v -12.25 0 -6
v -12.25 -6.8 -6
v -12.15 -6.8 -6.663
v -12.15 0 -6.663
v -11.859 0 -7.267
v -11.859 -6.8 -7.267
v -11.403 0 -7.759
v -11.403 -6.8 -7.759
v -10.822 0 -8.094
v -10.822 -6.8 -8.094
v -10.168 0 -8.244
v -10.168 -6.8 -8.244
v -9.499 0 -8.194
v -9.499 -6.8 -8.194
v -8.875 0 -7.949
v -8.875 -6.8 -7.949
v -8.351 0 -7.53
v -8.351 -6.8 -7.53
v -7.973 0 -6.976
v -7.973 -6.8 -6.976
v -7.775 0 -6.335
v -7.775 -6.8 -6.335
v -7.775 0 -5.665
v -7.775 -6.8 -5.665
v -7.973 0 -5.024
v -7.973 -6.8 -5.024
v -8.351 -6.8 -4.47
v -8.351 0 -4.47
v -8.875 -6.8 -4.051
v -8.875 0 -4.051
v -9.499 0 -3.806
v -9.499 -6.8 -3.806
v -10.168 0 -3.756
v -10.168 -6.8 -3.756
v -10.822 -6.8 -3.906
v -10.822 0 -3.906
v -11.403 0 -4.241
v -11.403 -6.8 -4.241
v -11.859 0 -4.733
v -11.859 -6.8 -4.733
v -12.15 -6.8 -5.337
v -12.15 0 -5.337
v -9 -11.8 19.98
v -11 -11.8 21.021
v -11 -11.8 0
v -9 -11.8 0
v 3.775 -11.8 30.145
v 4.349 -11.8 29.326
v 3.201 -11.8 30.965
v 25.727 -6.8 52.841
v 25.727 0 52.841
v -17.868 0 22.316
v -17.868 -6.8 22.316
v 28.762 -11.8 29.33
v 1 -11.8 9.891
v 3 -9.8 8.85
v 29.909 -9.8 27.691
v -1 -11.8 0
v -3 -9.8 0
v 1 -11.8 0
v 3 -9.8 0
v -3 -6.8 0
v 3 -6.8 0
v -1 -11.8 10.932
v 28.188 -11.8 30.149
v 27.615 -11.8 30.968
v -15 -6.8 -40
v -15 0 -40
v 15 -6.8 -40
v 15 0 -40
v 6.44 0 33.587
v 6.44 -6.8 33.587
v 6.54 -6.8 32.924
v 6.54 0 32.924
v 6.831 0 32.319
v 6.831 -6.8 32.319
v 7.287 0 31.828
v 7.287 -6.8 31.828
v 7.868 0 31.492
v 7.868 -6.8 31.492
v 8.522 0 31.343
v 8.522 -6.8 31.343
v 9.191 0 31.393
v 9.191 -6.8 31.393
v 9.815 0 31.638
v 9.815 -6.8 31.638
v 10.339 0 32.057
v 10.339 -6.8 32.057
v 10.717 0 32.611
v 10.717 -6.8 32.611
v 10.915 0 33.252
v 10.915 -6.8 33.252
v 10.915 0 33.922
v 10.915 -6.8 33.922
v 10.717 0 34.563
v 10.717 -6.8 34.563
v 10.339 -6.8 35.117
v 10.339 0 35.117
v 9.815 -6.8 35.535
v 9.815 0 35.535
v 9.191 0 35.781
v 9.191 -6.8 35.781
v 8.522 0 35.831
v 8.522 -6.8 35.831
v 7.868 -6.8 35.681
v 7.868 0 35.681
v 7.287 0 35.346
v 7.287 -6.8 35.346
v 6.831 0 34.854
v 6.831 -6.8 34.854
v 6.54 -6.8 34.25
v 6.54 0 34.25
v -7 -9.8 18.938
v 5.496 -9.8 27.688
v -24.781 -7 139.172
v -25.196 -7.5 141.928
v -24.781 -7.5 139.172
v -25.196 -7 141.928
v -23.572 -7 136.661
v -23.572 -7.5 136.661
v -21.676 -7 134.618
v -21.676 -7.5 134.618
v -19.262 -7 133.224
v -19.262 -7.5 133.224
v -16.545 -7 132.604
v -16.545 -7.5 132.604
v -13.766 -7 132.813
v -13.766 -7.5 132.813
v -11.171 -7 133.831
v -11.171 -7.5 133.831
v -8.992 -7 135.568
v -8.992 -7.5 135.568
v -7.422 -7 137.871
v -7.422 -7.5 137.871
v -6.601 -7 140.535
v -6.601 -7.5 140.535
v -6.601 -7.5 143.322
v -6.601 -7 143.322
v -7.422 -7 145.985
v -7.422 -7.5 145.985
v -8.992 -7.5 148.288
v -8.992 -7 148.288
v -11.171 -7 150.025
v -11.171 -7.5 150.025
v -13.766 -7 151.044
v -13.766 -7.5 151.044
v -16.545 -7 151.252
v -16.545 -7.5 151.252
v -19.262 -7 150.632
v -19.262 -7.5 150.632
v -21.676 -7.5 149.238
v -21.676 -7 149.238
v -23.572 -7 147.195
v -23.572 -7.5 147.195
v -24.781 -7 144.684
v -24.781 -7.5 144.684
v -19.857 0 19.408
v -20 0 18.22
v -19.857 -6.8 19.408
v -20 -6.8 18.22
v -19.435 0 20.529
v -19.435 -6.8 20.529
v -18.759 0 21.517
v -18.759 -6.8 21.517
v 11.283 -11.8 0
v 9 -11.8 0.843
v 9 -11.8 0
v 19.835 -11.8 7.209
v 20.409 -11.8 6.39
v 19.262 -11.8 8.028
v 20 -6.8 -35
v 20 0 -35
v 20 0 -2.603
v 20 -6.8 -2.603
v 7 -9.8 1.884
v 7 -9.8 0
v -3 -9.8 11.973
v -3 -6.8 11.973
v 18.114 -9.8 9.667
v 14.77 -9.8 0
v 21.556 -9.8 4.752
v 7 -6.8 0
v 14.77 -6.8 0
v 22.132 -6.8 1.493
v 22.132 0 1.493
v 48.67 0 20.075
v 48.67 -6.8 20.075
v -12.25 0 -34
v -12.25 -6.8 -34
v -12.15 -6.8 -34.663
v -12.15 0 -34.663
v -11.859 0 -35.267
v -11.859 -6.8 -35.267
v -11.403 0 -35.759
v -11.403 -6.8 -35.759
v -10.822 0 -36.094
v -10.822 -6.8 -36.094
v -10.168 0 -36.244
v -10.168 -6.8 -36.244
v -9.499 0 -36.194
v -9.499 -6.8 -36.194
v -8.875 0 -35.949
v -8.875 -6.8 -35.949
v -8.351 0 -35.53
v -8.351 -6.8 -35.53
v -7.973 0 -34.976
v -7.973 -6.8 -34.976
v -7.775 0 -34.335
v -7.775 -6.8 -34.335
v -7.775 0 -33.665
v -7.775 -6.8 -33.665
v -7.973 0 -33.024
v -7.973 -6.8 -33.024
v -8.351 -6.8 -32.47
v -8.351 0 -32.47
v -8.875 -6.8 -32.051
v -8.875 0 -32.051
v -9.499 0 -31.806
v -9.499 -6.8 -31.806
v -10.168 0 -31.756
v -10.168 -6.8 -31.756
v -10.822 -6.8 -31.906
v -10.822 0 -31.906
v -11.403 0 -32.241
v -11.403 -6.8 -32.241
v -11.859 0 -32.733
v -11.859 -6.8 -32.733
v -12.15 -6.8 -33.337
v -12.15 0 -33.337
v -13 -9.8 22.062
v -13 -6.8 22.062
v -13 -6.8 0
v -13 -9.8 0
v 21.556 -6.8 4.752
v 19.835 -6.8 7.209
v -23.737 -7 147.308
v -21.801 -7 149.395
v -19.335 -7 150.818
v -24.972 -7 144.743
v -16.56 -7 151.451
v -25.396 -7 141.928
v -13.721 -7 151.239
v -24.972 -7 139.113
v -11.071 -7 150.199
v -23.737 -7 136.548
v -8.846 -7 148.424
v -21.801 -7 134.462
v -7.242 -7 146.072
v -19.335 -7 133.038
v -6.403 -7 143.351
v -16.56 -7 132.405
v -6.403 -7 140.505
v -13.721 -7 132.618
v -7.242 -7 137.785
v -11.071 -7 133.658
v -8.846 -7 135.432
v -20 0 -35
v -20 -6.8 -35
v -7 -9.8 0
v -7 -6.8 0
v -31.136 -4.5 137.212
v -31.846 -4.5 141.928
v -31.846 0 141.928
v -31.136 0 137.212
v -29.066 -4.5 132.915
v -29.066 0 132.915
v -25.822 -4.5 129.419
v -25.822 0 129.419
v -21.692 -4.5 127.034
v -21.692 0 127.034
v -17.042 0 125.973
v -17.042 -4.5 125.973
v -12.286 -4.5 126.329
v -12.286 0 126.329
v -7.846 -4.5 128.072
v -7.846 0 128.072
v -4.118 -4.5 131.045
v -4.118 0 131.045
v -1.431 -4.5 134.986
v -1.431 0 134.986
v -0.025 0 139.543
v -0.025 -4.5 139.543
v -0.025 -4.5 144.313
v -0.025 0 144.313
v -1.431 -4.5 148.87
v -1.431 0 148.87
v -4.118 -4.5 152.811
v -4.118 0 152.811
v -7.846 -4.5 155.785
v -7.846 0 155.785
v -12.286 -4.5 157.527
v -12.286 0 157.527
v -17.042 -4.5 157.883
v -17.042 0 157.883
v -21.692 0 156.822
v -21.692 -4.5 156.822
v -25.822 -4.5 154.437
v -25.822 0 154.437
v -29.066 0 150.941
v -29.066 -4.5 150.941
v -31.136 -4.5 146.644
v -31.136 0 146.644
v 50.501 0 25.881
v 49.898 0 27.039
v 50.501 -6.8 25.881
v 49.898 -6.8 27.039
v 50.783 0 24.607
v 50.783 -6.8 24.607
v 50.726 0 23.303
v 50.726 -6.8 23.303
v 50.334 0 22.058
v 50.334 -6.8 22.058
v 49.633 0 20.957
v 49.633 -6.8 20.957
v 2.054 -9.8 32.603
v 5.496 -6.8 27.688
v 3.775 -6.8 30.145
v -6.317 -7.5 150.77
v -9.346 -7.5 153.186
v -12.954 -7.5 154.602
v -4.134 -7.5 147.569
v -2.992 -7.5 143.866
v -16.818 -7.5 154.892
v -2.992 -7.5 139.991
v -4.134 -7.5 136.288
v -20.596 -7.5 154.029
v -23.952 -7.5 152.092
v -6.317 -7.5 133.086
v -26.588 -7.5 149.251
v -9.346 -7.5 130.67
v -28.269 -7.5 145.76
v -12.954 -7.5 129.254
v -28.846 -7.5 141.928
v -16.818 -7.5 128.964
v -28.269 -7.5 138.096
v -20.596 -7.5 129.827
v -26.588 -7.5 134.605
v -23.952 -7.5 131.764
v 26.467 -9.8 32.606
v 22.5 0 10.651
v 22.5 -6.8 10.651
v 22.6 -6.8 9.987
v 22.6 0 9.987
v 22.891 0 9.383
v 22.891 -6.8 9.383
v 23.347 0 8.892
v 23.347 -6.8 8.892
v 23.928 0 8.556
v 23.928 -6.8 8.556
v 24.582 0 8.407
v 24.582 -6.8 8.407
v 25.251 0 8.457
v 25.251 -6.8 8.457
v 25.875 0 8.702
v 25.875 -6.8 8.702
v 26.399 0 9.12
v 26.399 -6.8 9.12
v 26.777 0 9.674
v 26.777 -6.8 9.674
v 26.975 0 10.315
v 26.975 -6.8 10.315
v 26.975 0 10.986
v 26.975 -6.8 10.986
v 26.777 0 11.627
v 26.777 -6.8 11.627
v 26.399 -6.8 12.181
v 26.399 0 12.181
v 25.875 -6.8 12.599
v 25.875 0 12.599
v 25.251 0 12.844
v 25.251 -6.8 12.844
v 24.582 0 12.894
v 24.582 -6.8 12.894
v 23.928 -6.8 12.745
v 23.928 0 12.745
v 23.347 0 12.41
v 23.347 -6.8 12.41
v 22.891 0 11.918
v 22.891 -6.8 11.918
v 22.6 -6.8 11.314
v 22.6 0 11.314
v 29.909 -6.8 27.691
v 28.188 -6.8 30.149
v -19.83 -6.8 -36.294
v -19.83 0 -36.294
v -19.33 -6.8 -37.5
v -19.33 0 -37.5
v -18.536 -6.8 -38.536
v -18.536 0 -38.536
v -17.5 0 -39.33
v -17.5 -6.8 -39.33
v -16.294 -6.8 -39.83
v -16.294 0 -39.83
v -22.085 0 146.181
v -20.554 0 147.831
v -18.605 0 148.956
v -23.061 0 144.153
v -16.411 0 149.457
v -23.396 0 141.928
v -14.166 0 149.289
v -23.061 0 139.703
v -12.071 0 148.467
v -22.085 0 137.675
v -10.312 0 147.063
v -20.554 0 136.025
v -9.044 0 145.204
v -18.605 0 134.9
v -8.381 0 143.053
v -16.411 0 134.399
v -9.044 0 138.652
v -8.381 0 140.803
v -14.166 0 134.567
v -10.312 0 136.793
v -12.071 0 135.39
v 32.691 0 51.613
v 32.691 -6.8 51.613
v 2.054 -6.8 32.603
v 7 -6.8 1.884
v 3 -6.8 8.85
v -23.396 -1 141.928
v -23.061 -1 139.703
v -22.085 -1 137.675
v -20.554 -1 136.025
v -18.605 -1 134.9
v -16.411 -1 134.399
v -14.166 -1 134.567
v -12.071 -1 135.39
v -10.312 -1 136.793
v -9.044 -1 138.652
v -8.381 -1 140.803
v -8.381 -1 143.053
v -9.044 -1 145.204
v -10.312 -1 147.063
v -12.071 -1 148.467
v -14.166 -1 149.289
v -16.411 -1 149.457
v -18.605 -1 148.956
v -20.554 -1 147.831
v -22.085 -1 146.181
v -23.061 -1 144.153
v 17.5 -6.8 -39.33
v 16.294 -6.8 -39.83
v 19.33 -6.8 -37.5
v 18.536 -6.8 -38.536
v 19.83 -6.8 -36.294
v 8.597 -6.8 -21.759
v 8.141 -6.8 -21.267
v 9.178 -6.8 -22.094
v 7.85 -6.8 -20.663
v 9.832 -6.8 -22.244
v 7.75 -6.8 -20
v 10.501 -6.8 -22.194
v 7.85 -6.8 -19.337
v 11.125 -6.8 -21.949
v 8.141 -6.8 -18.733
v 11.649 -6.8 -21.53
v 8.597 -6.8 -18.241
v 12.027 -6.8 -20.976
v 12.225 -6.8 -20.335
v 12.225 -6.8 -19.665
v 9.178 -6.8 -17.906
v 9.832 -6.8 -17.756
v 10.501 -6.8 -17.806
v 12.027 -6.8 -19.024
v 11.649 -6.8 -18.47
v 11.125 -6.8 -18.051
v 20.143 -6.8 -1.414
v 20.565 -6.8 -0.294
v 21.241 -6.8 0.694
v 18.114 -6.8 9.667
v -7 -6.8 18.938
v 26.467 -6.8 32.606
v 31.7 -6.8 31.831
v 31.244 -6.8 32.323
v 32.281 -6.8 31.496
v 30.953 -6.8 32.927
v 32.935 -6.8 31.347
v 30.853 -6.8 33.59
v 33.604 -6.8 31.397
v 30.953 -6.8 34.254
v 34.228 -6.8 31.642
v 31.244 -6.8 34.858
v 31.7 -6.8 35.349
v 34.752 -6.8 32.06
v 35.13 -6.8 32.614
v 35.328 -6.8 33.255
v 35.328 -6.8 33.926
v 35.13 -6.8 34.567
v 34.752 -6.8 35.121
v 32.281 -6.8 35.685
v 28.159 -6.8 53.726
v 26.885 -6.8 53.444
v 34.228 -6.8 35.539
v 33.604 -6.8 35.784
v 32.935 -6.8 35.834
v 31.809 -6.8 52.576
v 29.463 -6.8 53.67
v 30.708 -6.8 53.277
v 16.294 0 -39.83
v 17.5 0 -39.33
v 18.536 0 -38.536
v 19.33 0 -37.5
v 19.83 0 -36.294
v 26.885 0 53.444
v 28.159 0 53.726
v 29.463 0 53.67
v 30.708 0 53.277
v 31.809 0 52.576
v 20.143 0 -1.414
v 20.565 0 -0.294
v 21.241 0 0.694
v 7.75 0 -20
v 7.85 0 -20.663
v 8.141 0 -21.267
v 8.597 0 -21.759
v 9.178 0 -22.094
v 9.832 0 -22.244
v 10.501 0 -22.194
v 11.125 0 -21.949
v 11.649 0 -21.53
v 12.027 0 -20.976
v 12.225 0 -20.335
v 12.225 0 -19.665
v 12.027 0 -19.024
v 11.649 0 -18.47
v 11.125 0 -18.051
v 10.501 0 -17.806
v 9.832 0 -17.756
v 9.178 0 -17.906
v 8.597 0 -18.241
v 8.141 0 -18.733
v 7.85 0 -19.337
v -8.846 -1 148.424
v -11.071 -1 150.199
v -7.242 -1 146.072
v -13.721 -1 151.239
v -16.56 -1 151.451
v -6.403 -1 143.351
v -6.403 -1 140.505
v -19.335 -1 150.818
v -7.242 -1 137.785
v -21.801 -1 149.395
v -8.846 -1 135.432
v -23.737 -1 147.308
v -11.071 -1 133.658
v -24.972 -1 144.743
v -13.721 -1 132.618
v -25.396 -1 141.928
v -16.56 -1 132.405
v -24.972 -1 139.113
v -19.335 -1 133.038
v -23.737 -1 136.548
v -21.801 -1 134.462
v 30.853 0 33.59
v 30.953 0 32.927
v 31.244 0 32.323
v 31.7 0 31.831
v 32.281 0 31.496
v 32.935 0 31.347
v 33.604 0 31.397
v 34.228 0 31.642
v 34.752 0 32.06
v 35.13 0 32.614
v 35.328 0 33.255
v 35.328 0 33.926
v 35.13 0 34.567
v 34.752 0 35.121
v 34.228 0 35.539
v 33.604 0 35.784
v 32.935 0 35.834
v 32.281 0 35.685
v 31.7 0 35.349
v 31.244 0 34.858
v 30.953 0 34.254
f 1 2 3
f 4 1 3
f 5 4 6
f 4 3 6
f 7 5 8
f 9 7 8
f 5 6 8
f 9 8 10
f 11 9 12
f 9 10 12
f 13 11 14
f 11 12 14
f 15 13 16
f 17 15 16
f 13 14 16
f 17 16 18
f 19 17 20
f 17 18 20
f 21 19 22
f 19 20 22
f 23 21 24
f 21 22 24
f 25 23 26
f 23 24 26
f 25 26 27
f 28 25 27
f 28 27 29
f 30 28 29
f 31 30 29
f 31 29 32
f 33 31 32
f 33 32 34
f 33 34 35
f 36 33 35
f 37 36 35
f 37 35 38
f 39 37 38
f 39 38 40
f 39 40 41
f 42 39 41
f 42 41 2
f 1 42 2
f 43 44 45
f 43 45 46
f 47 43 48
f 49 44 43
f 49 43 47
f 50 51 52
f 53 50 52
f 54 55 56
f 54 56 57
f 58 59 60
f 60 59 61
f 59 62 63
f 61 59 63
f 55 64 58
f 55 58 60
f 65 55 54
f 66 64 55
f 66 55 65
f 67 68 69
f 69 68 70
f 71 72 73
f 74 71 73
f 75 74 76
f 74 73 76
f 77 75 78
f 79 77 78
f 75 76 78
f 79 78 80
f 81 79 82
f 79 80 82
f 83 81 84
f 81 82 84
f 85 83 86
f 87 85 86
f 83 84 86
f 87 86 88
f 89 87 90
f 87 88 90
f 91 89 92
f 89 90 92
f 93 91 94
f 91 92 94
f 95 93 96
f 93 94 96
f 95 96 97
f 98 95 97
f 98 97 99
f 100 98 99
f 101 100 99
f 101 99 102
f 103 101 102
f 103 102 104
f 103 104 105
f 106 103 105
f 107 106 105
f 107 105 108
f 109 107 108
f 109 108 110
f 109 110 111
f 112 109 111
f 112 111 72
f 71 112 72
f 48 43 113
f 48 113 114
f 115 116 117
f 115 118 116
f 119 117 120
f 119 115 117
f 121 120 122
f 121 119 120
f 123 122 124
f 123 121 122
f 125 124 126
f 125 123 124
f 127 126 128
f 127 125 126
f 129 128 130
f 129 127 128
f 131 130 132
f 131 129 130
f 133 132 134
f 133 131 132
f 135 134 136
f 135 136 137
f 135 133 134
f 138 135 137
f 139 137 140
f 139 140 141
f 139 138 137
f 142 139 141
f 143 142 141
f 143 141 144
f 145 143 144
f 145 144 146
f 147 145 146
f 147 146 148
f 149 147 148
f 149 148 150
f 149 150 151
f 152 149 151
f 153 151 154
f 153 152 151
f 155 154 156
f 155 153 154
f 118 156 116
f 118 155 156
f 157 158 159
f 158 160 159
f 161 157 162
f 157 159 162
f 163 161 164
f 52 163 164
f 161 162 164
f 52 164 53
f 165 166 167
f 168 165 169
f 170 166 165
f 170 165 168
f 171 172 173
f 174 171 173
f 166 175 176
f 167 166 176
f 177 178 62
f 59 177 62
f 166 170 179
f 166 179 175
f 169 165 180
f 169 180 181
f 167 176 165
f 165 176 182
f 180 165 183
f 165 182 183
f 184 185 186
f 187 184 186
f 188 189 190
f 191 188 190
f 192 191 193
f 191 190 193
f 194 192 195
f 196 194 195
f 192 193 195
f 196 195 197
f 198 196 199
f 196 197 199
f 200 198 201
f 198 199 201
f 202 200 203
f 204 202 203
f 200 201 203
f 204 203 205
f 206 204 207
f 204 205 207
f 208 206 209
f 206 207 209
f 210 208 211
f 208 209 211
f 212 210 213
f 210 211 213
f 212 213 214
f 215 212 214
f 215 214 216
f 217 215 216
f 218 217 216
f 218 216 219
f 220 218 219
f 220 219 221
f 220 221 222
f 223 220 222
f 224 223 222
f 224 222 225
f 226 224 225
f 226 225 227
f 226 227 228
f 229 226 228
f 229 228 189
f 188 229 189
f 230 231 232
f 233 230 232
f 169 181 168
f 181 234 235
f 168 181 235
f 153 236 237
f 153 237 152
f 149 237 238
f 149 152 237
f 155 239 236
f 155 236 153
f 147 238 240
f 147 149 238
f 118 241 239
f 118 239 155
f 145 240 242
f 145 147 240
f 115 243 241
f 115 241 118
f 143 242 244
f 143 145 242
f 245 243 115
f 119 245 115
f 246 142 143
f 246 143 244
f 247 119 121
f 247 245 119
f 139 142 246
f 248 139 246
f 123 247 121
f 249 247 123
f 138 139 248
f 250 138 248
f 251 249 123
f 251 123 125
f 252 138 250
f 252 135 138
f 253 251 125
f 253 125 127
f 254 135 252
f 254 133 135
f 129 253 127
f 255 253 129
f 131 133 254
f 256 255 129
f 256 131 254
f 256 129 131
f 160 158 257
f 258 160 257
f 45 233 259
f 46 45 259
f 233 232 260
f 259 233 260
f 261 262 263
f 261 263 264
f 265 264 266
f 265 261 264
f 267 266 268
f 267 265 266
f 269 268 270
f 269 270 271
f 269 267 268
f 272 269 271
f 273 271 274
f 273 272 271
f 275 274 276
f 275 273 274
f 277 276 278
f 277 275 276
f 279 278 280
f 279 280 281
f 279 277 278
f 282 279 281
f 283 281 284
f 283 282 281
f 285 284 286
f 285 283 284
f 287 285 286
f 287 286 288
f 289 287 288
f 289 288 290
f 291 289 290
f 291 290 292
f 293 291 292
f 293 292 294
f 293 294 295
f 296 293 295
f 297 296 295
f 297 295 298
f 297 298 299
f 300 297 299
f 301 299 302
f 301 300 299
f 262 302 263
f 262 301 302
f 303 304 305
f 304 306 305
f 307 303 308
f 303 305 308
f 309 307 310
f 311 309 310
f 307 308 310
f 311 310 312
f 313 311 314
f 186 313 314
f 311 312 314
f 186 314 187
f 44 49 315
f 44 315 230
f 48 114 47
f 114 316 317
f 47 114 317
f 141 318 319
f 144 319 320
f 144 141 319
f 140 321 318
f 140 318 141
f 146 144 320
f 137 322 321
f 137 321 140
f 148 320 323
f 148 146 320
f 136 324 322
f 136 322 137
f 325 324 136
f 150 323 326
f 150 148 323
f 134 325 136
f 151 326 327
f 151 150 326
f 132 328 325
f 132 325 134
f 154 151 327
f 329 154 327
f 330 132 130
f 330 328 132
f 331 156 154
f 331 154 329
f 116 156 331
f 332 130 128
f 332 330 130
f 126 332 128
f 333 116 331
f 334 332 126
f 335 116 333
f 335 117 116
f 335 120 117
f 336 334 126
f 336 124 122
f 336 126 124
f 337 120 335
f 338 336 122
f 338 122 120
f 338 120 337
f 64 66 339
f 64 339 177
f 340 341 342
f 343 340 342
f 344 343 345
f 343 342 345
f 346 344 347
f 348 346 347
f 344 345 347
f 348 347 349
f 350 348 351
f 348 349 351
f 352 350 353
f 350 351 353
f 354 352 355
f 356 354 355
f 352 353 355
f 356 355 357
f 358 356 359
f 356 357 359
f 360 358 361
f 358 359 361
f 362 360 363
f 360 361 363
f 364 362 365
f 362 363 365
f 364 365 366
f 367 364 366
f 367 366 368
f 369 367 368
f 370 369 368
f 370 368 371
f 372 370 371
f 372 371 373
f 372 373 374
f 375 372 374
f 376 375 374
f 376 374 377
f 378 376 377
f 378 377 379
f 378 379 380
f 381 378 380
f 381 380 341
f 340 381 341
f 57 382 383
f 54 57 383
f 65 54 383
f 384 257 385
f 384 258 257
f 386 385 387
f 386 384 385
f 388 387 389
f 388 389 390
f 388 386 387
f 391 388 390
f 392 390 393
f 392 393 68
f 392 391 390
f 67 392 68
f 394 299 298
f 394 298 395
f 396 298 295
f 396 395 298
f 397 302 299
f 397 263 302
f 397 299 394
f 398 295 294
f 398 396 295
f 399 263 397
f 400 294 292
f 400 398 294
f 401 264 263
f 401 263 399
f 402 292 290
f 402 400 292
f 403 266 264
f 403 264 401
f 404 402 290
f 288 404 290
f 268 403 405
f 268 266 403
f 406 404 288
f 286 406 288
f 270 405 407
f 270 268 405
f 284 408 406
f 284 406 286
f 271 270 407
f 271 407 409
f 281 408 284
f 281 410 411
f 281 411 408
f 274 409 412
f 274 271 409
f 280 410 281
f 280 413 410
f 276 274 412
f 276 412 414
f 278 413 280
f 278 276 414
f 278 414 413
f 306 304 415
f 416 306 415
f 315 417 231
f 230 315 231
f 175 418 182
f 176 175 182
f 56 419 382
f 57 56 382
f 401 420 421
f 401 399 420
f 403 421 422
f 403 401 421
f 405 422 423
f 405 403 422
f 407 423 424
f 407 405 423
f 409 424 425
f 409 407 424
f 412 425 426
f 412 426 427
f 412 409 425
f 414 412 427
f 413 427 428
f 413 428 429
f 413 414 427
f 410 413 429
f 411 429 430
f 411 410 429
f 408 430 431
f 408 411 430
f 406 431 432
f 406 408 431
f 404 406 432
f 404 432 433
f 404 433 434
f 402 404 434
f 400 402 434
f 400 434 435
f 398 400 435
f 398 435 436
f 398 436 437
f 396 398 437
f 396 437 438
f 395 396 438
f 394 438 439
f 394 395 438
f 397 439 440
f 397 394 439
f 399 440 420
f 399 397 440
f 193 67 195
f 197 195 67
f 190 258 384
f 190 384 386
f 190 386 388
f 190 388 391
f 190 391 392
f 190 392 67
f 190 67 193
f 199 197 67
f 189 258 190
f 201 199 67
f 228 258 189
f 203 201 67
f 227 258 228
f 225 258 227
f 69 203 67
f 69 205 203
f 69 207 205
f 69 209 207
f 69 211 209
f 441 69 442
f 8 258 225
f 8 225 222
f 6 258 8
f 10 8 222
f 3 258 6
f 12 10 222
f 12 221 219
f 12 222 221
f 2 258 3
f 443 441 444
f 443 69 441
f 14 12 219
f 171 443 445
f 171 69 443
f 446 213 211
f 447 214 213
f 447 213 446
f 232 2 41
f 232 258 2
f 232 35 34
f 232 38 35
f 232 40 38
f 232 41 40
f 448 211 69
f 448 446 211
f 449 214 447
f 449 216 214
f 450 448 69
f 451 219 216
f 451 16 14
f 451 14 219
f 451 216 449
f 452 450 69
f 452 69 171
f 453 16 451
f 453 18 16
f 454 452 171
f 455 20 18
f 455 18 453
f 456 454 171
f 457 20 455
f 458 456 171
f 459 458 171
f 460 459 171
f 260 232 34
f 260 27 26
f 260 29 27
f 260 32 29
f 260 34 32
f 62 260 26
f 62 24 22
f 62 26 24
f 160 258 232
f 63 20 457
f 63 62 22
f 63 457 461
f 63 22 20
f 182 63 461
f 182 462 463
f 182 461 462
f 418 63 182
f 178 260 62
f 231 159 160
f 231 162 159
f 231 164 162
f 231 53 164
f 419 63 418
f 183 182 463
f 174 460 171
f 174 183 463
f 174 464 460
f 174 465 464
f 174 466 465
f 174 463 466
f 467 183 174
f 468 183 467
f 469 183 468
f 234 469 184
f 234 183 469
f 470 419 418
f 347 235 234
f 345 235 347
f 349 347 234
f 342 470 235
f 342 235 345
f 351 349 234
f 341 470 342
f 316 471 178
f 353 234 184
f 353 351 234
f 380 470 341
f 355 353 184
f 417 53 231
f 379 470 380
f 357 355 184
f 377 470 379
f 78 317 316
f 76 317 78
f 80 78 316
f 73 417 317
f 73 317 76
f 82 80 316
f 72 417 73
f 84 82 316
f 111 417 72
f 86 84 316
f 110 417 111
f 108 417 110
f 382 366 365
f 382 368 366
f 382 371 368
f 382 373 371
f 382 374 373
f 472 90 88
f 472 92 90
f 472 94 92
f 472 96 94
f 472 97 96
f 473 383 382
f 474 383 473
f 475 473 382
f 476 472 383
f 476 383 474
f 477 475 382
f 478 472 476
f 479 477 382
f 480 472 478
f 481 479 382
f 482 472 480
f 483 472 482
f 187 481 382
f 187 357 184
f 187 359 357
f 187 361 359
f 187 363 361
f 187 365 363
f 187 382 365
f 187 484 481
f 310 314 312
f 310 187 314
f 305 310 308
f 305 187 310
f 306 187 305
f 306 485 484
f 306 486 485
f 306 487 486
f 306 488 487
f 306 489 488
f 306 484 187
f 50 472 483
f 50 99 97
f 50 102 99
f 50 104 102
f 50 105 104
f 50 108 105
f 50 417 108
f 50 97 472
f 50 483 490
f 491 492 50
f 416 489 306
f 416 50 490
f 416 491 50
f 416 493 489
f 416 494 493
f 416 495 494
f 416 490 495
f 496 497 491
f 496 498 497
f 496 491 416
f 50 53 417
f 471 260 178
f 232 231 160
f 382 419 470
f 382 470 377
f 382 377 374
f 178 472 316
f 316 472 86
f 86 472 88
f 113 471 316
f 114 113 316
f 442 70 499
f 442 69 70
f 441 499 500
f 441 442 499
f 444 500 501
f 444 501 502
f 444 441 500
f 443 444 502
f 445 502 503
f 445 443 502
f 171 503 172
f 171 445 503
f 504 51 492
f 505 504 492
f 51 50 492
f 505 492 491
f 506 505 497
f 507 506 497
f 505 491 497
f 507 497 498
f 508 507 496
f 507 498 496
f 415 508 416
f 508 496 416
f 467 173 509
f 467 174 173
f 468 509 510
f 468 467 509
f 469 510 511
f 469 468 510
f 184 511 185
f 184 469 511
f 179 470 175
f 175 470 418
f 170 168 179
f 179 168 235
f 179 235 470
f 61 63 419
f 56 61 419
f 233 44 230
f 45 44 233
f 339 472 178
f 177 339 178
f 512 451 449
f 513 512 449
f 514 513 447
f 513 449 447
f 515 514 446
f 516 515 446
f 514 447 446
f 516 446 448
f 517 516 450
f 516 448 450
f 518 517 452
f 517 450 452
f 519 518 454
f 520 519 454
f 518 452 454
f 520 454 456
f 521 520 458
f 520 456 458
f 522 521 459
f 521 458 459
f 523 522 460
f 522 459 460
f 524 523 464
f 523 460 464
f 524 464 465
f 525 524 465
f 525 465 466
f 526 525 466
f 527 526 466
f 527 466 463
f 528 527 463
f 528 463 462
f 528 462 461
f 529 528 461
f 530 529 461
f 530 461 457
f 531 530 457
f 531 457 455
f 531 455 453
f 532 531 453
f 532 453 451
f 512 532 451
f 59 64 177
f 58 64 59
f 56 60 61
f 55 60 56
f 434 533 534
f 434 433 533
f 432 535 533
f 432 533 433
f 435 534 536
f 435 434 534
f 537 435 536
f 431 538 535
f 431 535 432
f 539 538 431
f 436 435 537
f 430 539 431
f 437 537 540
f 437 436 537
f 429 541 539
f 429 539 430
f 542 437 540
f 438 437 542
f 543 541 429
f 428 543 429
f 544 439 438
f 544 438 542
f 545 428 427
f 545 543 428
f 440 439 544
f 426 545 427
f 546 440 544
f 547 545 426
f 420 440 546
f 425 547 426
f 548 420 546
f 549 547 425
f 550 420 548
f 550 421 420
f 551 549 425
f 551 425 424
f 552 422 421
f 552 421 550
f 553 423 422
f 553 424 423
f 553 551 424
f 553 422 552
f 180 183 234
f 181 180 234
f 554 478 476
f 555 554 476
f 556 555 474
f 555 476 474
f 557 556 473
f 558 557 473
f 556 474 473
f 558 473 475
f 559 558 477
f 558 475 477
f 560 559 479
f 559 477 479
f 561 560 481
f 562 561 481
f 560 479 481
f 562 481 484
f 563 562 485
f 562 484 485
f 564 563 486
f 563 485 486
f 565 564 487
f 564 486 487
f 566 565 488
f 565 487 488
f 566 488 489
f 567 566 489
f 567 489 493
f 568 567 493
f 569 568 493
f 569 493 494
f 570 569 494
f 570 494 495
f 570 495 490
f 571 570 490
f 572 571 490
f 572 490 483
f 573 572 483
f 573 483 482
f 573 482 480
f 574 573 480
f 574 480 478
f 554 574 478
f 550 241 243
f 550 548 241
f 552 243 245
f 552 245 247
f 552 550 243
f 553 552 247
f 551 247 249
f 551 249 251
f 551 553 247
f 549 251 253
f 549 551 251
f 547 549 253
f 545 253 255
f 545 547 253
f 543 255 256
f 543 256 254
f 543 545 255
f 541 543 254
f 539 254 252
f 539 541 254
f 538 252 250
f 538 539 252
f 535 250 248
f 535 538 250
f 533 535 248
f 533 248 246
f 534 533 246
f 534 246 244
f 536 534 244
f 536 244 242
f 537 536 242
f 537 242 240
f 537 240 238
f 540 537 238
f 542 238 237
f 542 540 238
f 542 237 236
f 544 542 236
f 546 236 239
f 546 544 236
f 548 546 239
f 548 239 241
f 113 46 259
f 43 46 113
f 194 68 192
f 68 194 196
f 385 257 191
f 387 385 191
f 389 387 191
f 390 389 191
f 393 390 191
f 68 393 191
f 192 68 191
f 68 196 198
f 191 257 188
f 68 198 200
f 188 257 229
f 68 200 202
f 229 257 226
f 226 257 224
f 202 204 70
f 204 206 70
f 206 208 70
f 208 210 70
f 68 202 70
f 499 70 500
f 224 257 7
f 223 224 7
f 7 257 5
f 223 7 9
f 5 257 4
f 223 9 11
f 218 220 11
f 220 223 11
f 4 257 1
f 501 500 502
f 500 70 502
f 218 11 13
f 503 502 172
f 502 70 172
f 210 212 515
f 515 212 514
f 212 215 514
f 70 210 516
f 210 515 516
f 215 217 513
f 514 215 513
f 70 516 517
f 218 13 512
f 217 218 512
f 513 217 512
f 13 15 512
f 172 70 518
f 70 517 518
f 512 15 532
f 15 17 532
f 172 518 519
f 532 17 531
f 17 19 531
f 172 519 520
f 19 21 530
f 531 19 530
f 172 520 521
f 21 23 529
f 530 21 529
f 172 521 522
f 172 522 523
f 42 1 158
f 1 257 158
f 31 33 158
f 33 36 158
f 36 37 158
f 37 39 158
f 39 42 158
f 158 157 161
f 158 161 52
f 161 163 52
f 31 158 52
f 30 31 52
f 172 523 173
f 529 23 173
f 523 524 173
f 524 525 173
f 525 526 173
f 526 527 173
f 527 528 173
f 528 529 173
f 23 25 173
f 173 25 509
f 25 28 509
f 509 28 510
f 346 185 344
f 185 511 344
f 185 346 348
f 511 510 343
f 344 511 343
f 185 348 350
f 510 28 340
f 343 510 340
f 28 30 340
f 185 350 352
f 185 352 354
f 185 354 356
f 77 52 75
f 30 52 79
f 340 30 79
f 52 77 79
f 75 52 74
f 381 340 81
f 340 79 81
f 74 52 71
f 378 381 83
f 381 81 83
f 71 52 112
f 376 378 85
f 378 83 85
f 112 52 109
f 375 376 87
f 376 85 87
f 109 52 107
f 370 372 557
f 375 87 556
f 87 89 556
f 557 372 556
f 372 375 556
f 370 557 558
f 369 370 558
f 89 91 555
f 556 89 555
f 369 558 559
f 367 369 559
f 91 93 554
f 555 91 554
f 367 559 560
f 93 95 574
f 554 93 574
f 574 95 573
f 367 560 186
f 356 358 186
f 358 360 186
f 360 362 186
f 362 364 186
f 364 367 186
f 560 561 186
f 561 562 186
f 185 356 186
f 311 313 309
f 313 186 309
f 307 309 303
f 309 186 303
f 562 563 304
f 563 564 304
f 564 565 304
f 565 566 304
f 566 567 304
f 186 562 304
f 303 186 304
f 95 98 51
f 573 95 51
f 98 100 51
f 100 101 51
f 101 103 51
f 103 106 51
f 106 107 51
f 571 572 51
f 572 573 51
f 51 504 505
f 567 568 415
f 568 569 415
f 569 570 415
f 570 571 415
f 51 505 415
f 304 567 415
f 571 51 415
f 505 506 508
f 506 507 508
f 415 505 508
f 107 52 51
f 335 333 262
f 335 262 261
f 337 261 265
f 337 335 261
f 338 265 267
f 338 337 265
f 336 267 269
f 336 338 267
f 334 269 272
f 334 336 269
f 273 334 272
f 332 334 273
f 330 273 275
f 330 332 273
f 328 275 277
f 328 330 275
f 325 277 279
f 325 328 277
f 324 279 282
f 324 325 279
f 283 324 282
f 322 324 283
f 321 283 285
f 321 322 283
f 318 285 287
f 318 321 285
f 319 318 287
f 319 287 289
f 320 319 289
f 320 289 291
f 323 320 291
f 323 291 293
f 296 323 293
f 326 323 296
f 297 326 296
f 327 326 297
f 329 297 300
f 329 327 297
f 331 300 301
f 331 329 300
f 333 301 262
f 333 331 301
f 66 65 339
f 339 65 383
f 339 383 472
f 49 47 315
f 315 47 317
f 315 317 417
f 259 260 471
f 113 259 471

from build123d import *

# Parameters (mm, degrees)
F2_DEPTH = 6.8
F3_D     = 4.5
F5_DEPTH = 5
F6_SIZE  = 2
F7_R     = 5
F11_SIZE = 3


with BuildPart() as f2:
    # F1 (on Front) → F2 (new body)
    with BuildSketch(Plane.XZ):
        Polygon((-20, 20.8226820221), (-20, -40), (20, -40), (20, 0), (52.7660817716, 22.943057454), (29.8230243175, 55.7091392256), align=None)
    extrude(amount=F2_DEPTH)

    # F3 (through all)
    with Locations(Plane(origin=(0, 0, 0), x_dir=(1, 0, 0), z_dir=(0, 1, 0))):
        with Locations((-10, 6), (10, 20), (-10, 34), (8.689921607, -33.5869338693), (24.7500618248, -10.6506766292), (33.1030326016, -33.5903339763)):
            Hole(F3_D / 2)

    # F4 (on face) → F5 (join)
    with BuildSketch(Plane.XZ.offset(6.8)):
        Polygon((29.908849645, 27.6914192253), (28.1881203359, 30.1488753582), (0, 10.411341011), (0, 0), (3, 0), (3, 8.8496398594), align=None)
        Polygon((0, 10.411341011), (28.1881203359, 30.1488753582), (26.4673910269, 32.6063314911), (-3, 11.9730421627), (-3, 0), (0, 0), align=None)
        Polygon((21.5558788681, 4.7517618783), (19.835149559, 7.2092180111), (10, 0.3225721505), (10, 0), (14.7696596131, 0), align=None)
        Polygon((10, 0.3225721505), (19.835149559, 7.2092180111), (18.11442025, 9.666674144), (7, 1.8842733021), (7, 0), (10, 0), align=None)
        Polygon((5.4957386503, 27.6880191184), (3.7750093412, 30.1454752512), (-10, 20.5001098716), (-10, 0), (-7, 0), (-7, 18.9384087199), align=None)
        Polygon((-10, 20.5001098716), (3.7750093412, 30.1454752512), (2.0542800322, 32.6029313841), (-13, 22.0618110233), (-13, 0), (-10, 0), align=None)
    extrude(amount=F5_DEPTH)

    # F6
    f6_edges = [f2.edges().sort_by_distance(p)[0] for p in [
        (-5.47286, -11.8, 27.332371),
        (-13, -11.8, 11.030906),
        (-0.752131, -11.8, 23.313214),
        (-7, -11.8, 9.469204),
        (11.733696, -11.8, 22.289687),
        (-3, -11.8, 5.986521),
        (16.454425, -11.8, 18.27053),
        (3, -11.8, 4.42482),
        (12.55721, -11.8, 5.775474),
        (18.162769, -11.8, 2.375881),
        (7, -11.8, 0.942137),
    ]]
    chamfer(f6_edges, length=F6_SIZE)

    # F7
    f7_edges = [f2.edges().sort_by_distance(p)[0] for p in [
        (-20, -3.4, 20.822682),
        (29.823024, -3.4, 55.709139),
        (-20, -3.4, -40),
        (20, -3.4, -40),
        (20, -3.4, 0),
        (52.766082, -3.4, 22.943057),
    ]]
    fillet(f7_edges, radius=F7_R)


with BuildPart() as f10:
    # F9 (on plane+point) → F10 (revolve)
    with BuildSketch(Plane.XY.offset(141.9280942783)):
        Polygon((-25.1964228942, -7.5), (-25.1964228942, -7), (-25.3964228942, -7), (-25.3964228942, -1), (-23.3964228942, -1), (-23.3964228942, 0), (-31.8464228942, 0), (-31.8464228942, -7.5), align=None)
    revolve(axis=Axis((-15.8464228942, -39.9798490107, 141.9280942783), (0, -1, 0)))

    # F11
    f11_edges = [f10.edges().sort_by_distance(p)[0] for p in [
        (0.153577, -7.5, 141.928094),
    ]]
    chamfer(f11_edges, length=F11_SIZE)


solid = Compound([f2.part, f10.part])
